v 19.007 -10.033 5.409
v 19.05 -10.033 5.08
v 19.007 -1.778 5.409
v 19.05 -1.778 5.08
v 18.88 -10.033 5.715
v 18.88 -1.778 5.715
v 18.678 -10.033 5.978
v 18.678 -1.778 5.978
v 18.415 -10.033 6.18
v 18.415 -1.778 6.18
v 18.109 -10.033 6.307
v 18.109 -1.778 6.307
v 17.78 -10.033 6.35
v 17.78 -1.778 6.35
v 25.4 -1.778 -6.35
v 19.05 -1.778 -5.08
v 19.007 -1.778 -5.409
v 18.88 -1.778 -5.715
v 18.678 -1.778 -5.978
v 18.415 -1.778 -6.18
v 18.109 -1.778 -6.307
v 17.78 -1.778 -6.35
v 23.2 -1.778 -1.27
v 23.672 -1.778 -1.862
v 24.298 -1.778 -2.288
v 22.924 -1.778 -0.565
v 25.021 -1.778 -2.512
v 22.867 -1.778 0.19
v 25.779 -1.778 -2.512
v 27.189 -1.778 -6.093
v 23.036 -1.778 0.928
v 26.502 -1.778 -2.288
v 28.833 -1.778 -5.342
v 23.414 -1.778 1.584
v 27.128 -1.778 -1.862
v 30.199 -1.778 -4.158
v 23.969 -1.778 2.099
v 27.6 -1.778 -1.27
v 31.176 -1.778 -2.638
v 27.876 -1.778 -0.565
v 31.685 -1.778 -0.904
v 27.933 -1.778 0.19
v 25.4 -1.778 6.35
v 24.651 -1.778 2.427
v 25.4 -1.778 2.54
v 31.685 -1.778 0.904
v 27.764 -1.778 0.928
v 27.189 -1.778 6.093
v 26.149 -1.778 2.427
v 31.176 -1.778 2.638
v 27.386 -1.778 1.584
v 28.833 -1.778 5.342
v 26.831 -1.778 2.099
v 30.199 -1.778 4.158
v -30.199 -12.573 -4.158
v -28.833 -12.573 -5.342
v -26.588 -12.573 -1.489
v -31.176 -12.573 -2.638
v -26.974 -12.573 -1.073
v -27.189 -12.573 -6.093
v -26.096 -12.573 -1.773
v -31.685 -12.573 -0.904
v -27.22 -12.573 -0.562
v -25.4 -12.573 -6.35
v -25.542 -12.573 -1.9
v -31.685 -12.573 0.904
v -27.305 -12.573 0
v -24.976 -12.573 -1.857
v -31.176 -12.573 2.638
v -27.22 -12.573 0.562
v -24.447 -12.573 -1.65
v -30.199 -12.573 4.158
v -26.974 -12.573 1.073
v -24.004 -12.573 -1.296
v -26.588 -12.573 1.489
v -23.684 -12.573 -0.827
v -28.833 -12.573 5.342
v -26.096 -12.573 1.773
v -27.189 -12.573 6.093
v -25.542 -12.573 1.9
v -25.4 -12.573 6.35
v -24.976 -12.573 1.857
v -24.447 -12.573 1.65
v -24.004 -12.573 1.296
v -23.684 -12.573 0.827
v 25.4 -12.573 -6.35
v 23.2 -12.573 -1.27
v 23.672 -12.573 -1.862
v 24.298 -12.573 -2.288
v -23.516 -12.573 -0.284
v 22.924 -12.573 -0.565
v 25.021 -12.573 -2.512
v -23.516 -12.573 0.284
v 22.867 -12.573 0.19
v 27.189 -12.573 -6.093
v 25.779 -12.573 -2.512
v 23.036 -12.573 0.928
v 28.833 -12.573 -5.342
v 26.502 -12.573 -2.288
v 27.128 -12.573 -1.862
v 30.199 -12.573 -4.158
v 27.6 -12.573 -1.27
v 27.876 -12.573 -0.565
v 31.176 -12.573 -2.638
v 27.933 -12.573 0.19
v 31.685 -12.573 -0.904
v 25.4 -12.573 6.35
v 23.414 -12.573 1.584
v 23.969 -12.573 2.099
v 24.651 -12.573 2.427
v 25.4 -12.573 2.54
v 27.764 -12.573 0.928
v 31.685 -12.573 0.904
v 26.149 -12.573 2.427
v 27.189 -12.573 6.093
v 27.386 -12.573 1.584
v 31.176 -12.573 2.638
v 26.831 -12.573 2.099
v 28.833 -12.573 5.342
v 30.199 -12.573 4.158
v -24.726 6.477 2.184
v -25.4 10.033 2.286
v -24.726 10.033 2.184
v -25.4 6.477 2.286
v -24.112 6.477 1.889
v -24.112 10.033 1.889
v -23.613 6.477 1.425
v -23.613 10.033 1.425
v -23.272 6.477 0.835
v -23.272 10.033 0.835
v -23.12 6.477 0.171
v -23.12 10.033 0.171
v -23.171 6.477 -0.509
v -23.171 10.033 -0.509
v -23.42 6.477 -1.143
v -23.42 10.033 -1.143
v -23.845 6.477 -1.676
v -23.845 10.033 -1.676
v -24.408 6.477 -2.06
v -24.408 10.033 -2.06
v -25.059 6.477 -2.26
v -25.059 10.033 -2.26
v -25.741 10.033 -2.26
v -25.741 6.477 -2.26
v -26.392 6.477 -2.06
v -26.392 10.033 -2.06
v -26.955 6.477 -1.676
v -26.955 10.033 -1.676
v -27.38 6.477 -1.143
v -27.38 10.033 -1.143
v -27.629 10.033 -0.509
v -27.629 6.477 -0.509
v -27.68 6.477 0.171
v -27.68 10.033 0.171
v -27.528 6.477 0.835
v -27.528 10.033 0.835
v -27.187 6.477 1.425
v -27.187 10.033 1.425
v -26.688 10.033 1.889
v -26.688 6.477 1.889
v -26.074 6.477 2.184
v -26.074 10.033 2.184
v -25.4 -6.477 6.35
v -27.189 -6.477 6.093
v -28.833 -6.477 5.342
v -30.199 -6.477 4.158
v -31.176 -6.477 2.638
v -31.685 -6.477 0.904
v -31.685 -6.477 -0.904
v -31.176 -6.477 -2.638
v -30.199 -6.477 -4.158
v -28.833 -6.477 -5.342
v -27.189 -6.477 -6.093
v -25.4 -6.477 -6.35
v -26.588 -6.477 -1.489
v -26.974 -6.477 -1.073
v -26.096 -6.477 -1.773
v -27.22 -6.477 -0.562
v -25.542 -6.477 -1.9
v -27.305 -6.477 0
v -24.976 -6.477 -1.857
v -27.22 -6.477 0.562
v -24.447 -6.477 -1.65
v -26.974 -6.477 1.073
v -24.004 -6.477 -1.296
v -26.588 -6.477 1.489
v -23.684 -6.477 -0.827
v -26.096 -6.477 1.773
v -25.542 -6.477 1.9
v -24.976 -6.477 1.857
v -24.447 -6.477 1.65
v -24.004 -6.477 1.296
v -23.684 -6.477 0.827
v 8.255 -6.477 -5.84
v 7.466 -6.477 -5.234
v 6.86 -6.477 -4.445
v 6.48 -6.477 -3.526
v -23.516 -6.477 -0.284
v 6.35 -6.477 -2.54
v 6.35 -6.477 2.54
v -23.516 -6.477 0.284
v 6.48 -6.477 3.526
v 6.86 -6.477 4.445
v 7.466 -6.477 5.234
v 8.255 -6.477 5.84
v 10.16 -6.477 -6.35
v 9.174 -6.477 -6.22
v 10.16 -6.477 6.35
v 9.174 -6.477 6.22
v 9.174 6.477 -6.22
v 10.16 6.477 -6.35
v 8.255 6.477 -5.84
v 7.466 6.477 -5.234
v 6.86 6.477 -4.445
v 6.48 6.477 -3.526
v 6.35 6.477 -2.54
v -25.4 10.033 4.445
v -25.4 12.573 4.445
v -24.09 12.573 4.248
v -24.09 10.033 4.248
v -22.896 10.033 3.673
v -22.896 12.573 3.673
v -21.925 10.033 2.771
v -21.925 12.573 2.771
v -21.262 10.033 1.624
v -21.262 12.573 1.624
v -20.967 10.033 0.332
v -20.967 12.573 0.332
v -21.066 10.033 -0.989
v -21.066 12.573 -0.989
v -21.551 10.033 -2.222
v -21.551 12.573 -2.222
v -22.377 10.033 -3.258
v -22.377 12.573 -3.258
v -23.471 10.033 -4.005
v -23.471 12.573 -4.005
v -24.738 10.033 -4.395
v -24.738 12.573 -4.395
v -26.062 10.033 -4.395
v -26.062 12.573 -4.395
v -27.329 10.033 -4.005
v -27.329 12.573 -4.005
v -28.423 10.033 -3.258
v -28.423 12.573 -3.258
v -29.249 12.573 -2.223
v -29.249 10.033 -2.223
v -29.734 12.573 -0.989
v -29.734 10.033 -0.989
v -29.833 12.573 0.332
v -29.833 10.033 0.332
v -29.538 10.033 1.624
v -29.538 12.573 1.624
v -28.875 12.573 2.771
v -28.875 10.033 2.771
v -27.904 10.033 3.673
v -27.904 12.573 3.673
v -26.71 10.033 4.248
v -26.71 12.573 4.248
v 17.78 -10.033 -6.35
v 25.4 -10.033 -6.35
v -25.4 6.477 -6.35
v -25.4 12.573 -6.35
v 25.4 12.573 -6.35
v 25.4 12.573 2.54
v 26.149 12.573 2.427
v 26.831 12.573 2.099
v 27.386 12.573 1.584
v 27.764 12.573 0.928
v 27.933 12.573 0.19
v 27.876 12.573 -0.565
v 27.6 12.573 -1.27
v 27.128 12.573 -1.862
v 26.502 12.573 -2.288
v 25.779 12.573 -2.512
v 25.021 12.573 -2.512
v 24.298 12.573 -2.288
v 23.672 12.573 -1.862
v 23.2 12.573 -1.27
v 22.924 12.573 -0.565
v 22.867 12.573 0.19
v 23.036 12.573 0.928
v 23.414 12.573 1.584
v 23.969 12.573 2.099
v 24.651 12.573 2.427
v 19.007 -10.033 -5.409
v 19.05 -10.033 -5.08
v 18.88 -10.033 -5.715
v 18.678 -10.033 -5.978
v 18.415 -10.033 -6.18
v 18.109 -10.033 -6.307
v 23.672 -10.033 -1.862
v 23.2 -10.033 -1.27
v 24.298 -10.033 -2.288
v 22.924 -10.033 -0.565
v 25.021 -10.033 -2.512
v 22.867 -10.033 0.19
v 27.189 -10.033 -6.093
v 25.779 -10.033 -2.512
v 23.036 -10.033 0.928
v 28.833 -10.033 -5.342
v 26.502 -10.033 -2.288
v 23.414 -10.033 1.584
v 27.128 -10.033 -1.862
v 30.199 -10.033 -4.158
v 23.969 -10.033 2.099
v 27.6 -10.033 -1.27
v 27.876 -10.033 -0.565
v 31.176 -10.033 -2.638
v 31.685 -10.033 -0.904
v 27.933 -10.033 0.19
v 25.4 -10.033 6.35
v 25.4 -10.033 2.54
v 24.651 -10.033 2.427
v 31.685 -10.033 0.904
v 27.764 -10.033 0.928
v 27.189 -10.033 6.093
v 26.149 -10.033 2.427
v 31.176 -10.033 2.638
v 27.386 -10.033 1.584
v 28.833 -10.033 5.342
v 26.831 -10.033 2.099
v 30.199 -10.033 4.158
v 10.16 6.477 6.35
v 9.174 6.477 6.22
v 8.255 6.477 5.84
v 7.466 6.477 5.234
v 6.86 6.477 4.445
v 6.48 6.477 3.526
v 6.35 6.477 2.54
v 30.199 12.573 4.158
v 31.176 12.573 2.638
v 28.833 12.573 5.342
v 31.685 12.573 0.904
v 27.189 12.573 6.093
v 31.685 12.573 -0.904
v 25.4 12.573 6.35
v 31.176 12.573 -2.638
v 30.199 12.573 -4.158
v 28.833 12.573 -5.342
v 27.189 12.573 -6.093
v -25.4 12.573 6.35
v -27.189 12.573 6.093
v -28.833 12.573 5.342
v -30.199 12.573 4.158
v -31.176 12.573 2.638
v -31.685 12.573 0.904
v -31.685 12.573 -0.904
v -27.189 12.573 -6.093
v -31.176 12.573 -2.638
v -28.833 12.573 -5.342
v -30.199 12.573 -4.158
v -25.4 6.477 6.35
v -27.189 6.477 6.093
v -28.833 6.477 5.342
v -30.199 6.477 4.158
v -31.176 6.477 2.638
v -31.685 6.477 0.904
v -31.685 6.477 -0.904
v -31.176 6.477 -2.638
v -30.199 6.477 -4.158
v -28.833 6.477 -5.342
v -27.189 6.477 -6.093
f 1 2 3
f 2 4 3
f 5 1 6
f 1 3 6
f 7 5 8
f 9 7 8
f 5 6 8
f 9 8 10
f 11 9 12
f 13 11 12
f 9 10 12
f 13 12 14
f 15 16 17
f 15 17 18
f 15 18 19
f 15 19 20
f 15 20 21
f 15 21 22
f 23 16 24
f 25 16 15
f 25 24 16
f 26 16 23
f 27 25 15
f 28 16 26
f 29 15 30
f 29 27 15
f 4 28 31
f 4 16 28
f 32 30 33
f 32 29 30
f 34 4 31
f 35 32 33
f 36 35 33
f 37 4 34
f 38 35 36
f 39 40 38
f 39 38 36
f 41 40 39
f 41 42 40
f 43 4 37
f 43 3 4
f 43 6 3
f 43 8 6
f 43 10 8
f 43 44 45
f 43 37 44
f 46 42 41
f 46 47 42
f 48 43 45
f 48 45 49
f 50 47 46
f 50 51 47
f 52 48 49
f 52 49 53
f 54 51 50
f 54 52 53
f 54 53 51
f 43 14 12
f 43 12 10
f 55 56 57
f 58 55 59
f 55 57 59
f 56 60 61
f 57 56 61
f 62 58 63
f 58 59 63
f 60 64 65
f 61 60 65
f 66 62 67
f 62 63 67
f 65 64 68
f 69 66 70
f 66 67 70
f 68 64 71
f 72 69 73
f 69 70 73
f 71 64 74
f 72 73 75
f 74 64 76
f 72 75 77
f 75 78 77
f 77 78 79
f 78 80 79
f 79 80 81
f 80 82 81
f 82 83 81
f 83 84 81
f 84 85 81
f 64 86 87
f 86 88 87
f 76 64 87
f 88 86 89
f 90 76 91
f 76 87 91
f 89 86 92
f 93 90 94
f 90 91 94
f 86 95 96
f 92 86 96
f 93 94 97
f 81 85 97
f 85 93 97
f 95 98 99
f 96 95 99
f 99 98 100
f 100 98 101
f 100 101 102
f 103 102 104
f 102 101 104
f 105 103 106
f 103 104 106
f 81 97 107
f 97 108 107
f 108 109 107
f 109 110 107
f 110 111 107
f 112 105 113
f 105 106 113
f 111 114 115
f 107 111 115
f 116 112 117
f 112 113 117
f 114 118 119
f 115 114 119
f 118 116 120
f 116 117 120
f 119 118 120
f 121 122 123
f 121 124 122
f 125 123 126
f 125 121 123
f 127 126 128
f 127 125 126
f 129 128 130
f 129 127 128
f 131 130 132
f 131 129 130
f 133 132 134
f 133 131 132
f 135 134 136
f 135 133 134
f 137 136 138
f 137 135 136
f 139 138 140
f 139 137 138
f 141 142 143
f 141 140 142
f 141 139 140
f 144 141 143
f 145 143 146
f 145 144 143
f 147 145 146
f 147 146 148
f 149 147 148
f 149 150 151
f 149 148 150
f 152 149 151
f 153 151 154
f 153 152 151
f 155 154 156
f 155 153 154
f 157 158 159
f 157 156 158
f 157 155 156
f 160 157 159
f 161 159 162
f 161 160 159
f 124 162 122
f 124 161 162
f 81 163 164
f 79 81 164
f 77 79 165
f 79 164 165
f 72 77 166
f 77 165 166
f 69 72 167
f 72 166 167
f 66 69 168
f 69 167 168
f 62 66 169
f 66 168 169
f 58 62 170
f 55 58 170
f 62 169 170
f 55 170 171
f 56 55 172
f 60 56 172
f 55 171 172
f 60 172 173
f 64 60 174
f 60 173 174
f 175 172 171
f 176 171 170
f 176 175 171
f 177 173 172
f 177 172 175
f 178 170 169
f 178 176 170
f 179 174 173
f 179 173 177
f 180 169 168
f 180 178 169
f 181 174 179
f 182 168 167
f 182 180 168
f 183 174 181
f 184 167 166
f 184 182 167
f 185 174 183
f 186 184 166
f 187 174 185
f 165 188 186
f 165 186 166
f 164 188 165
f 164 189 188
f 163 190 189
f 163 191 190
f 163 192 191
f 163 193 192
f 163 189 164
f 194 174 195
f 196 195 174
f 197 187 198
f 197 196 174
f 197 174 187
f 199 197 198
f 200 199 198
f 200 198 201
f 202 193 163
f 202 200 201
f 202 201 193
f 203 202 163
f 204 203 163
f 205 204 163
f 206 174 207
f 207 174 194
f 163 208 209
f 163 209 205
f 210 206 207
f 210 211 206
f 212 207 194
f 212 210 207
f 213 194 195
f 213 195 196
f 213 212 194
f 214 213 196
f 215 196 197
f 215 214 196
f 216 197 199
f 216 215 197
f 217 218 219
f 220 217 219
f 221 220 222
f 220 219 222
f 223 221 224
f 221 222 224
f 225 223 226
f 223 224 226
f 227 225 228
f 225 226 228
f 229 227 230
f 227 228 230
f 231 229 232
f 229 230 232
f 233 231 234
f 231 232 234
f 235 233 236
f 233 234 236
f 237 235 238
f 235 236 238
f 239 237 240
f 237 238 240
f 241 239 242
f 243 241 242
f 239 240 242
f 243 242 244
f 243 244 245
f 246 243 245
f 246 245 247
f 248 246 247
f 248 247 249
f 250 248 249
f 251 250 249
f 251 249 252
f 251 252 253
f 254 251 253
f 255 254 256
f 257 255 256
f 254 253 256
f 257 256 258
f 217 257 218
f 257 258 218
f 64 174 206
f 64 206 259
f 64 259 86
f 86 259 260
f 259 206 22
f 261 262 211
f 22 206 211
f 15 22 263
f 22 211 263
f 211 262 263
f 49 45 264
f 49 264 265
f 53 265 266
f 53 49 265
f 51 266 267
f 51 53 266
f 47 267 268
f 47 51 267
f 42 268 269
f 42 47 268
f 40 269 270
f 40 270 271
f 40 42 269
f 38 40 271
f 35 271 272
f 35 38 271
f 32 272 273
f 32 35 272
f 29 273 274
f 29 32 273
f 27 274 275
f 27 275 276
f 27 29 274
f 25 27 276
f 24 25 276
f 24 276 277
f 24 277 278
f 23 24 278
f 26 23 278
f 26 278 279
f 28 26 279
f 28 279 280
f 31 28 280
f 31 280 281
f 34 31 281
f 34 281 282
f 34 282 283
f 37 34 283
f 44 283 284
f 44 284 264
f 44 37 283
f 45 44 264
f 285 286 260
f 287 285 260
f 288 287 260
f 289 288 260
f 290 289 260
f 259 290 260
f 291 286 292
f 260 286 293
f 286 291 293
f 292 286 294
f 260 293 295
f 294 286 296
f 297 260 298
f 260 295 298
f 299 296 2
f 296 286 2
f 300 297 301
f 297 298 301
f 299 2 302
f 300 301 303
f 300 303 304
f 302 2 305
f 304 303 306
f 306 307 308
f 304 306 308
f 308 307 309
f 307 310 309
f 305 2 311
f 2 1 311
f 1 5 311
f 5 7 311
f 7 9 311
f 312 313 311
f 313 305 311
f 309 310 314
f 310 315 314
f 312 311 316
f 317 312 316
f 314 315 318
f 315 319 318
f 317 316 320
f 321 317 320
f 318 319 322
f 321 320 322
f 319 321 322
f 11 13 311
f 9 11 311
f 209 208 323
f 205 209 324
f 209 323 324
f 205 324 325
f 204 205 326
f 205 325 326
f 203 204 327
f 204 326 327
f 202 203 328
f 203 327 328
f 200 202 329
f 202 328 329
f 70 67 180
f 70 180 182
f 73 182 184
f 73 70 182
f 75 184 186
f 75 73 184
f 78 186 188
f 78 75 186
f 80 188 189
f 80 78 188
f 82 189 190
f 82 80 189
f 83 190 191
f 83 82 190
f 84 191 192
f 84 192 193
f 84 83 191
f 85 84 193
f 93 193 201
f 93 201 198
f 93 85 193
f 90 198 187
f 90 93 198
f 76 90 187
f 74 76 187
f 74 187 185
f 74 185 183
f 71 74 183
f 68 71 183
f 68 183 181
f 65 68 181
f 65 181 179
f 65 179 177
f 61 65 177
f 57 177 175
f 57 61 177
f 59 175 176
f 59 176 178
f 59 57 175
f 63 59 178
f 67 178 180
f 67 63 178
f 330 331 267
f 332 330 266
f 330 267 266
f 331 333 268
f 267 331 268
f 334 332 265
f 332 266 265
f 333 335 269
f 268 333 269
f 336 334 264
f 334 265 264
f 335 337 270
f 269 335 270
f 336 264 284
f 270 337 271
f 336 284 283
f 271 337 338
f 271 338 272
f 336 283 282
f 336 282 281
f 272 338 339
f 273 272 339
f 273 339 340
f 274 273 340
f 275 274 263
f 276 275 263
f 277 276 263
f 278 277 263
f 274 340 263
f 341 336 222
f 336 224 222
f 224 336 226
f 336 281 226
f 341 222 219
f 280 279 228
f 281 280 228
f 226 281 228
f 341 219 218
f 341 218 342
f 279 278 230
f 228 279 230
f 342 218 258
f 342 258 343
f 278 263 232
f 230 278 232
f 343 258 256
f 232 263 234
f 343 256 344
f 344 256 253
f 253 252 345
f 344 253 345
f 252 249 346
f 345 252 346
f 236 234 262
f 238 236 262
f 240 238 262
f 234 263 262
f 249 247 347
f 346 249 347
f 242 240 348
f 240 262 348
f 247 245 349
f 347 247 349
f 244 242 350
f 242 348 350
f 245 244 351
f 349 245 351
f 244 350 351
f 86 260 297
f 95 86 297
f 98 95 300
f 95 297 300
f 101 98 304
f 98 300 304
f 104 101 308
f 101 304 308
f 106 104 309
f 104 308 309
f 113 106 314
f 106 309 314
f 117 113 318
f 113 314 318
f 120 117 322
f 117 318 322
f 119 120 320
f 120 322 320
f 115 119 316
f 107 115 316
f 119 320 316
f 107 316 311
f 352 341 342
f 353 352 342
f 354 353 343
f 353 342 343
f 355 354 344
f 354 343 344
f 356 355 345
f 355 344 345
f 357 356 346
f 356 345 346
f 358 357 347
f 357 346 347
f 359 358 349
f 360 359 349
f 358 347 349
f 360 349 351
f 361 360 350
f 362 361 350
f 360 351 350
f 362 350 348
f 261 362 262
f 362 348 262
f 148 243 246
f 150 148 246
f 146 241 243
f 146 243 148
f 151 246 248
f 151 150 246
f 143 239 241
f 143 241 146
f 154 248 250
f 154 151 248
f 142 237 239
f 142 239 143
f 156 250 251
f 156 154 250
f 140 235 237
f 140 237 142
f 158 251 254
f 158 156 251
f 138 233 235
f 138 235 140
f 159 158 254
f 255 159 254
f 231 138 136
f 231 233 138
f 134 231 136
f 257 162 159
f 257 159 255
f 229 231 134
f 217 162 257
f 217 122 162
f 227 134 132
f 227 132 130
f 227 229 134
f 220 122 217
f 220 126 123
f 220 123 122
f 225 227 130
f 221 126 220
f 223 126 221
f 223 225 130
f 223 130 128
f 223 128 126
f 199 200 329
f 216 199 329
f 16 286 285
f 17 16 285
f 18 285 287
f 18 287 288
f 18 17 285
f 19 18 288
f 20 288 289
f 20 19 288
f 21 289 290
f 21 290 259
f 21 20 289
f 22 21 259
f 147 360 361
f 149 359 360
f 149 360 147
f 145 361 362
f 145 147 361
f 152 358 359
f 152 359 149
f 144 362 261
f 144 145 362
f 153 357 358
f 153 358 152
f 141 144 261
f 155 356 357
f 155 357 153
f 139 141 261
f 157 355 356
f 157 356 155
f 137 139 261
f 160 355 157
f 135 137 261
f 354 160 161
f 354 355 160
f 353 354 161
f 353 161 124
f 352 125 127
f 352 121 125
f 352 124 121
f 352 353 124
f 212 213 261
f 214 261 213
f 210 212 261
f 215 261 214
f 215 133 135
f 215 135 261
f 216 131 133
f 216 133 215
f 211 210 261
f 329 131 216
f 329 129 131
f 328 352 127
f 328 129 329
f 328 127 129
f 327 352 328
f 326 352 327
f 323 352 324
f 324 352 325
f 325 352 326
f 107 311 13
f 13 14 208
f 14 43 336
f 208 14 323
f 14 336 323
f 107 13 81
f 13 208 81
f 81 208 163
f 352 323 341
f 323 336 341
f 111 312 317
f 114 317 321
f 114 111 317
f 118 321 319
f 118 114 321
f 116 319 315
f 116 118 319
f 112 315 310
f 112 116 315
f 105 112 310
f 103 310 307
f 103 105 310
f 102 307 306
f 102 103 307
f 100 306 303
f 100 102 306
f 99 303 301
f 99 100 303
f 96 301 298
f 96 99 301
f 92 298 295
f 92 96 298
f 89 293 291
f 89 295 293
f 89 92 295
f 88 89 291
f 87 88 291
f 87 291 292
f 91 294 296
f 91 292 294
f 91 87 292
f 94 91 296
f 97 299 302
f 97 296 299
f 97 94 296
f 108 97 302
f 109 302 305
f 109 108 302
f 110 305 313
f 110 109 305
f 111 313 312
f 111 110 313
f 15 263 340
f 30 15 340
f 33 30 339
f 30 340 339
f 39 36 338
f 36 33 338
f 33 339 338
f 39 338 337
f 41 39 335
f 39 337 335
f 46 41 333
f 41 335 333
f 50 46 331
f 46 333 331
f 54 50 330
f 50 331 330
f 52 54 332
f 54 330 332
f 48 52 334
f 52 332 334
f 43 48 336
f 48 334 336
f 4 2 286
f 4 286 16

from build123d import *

# Parameters (mm, degrees)
SKETCH1_R           = 2.286
SKETCH1_R_2         = 2.54
BOSS_EXTRUDE1_DEPTH = 12.573
SKETCH2_W           = 38.1
SKETCH2_H           = 12.954
CUT_EXTRUDE1_DEPTH  = 37.433951597
SKETCH3_R           = 4.445
CUT_EXTRUDE2_DEPTH  = 2.54
BOSS_EXTRUDE2_START = -6.096
SKETCH4_R           = 2.286
SKETCH4_R_2         = 1.905
BOSS_EXTRUDE2_DEPTH = 6.096
FILLET1_R           = 3.81
SKETCH6_W           = 12.7
SKETCH6_H           = 8.255
CUT_EXTRUDE4_DEPTH  = 37.433951597
FILLET2_R           = 1.27


with BuildPart() as part:
    # Sketch1 → Boss-Extrude1 (new, symmetric)
    with BuildSketch(Plane(origin=(0, 0, 0), x_dir=(1, 0, 0), z_dir=(0, 1, 0))):
        with BuildLine():
            Line((-25.4, 6.35), (25.4, 6.35))
            ThreePointArc((25.4, 6.35), (31.75, 0), (25.4, -6.35))
            Line((25.4, -6.35), (-25.4, -6.35))
            ThreePointArc((-25.4, -6.35), (-31.75, 0), (-25.4, 6.35))
        make_face()
        with Locations(Location((-25.4, 0, 0), (0, 0, 270))):
            Circle(SKETCH1_R, mode=Mode.SUBTRACT)
        with Locations(Location((25.4, 0, 0), (0, 0, 270))):
            Circle(SKETCH1_R_2, mode=Mode.SUBTRACT)
    extrude(amount=BOSS_EXTRUDE1_DEPTH, both=True)

    # Sketch2 → Cut-Extrude1 (cut, through all)
    with BuildSketch(Plane.XY.offset(6.35)):
        with Locations((-12.7, 0)):
            Rectangle(SKETCH2_W, SKETCH2_H)
    extrude(amount=-CUT_EXTRUDE1_DEPTH, mode=Mode.SUBTRACT)

    # Sketch3 → Cut-Extrude2 (cut)
    with BuildSketch(Plane(origin=(0, 12.573, 0), x_dir=(1, 0, 0), z_dir=(0, 1, 0))):
        with Locations(Location((-25.4, 0, 0), (0, 0, 270))):
            Circle(SKETCH3_R)
    extrude(amount=-CUT_EXTRUDE2_DEPTH, mode=Mode.SUBTRACT)

    # Sketch4 → Boss-Extrude2 (add)
    with BuildSketch(Plane(origin=(0, -6.477, 0), x_dir=(1, 0, 0), z_dir=(0, 1, 0)).offset(BOSS_EXTRUDE2_START)):
        with Locations(Location((-25.4, 0, 0), (0, 0, 270))):
            Circle(SKETCH4_R)
        with Locations(Location((-25.4, 0, 0), (0, 0, 180))):
            Circle(SKETCH4_R_2, mode=Mode.SUBTRACT)
    extrude(amount=BOSS_EXTRUDE2_DEPTH)

    # Fillet1
    fillet1_edges = [part.edges().sort_by_distance(p)[0] for p in [
        (6.35, 0, 6.35),
        (6.35, 0, -6.35),
    ]]
    fillet(fillet1_edges, radius=FILLET1_R)

    # Sketch6 → Cut-Extrude4 (cut, through all)
    with BuildSketch(Plane.XY.offset(6.35)):
        with Locations((25.4, -5.9055)):
            Rectangle(SKETCH6_W, SKETCH6_H)
    extrude(amount=-CUT_EXTRUDE4_DEPTH, mode=Mode.SUBTRACT)

    # Fillet2
    fillet2_edges = [part.edges().sort_by_distance(p)[0] for p in [
        (19.05, -5.9055, 6.35),
        (19.05, -5.9055, -6.35),
    ]]
    fillet(fillet2_edges, radius=FILLET2_R)


solid = part.part
